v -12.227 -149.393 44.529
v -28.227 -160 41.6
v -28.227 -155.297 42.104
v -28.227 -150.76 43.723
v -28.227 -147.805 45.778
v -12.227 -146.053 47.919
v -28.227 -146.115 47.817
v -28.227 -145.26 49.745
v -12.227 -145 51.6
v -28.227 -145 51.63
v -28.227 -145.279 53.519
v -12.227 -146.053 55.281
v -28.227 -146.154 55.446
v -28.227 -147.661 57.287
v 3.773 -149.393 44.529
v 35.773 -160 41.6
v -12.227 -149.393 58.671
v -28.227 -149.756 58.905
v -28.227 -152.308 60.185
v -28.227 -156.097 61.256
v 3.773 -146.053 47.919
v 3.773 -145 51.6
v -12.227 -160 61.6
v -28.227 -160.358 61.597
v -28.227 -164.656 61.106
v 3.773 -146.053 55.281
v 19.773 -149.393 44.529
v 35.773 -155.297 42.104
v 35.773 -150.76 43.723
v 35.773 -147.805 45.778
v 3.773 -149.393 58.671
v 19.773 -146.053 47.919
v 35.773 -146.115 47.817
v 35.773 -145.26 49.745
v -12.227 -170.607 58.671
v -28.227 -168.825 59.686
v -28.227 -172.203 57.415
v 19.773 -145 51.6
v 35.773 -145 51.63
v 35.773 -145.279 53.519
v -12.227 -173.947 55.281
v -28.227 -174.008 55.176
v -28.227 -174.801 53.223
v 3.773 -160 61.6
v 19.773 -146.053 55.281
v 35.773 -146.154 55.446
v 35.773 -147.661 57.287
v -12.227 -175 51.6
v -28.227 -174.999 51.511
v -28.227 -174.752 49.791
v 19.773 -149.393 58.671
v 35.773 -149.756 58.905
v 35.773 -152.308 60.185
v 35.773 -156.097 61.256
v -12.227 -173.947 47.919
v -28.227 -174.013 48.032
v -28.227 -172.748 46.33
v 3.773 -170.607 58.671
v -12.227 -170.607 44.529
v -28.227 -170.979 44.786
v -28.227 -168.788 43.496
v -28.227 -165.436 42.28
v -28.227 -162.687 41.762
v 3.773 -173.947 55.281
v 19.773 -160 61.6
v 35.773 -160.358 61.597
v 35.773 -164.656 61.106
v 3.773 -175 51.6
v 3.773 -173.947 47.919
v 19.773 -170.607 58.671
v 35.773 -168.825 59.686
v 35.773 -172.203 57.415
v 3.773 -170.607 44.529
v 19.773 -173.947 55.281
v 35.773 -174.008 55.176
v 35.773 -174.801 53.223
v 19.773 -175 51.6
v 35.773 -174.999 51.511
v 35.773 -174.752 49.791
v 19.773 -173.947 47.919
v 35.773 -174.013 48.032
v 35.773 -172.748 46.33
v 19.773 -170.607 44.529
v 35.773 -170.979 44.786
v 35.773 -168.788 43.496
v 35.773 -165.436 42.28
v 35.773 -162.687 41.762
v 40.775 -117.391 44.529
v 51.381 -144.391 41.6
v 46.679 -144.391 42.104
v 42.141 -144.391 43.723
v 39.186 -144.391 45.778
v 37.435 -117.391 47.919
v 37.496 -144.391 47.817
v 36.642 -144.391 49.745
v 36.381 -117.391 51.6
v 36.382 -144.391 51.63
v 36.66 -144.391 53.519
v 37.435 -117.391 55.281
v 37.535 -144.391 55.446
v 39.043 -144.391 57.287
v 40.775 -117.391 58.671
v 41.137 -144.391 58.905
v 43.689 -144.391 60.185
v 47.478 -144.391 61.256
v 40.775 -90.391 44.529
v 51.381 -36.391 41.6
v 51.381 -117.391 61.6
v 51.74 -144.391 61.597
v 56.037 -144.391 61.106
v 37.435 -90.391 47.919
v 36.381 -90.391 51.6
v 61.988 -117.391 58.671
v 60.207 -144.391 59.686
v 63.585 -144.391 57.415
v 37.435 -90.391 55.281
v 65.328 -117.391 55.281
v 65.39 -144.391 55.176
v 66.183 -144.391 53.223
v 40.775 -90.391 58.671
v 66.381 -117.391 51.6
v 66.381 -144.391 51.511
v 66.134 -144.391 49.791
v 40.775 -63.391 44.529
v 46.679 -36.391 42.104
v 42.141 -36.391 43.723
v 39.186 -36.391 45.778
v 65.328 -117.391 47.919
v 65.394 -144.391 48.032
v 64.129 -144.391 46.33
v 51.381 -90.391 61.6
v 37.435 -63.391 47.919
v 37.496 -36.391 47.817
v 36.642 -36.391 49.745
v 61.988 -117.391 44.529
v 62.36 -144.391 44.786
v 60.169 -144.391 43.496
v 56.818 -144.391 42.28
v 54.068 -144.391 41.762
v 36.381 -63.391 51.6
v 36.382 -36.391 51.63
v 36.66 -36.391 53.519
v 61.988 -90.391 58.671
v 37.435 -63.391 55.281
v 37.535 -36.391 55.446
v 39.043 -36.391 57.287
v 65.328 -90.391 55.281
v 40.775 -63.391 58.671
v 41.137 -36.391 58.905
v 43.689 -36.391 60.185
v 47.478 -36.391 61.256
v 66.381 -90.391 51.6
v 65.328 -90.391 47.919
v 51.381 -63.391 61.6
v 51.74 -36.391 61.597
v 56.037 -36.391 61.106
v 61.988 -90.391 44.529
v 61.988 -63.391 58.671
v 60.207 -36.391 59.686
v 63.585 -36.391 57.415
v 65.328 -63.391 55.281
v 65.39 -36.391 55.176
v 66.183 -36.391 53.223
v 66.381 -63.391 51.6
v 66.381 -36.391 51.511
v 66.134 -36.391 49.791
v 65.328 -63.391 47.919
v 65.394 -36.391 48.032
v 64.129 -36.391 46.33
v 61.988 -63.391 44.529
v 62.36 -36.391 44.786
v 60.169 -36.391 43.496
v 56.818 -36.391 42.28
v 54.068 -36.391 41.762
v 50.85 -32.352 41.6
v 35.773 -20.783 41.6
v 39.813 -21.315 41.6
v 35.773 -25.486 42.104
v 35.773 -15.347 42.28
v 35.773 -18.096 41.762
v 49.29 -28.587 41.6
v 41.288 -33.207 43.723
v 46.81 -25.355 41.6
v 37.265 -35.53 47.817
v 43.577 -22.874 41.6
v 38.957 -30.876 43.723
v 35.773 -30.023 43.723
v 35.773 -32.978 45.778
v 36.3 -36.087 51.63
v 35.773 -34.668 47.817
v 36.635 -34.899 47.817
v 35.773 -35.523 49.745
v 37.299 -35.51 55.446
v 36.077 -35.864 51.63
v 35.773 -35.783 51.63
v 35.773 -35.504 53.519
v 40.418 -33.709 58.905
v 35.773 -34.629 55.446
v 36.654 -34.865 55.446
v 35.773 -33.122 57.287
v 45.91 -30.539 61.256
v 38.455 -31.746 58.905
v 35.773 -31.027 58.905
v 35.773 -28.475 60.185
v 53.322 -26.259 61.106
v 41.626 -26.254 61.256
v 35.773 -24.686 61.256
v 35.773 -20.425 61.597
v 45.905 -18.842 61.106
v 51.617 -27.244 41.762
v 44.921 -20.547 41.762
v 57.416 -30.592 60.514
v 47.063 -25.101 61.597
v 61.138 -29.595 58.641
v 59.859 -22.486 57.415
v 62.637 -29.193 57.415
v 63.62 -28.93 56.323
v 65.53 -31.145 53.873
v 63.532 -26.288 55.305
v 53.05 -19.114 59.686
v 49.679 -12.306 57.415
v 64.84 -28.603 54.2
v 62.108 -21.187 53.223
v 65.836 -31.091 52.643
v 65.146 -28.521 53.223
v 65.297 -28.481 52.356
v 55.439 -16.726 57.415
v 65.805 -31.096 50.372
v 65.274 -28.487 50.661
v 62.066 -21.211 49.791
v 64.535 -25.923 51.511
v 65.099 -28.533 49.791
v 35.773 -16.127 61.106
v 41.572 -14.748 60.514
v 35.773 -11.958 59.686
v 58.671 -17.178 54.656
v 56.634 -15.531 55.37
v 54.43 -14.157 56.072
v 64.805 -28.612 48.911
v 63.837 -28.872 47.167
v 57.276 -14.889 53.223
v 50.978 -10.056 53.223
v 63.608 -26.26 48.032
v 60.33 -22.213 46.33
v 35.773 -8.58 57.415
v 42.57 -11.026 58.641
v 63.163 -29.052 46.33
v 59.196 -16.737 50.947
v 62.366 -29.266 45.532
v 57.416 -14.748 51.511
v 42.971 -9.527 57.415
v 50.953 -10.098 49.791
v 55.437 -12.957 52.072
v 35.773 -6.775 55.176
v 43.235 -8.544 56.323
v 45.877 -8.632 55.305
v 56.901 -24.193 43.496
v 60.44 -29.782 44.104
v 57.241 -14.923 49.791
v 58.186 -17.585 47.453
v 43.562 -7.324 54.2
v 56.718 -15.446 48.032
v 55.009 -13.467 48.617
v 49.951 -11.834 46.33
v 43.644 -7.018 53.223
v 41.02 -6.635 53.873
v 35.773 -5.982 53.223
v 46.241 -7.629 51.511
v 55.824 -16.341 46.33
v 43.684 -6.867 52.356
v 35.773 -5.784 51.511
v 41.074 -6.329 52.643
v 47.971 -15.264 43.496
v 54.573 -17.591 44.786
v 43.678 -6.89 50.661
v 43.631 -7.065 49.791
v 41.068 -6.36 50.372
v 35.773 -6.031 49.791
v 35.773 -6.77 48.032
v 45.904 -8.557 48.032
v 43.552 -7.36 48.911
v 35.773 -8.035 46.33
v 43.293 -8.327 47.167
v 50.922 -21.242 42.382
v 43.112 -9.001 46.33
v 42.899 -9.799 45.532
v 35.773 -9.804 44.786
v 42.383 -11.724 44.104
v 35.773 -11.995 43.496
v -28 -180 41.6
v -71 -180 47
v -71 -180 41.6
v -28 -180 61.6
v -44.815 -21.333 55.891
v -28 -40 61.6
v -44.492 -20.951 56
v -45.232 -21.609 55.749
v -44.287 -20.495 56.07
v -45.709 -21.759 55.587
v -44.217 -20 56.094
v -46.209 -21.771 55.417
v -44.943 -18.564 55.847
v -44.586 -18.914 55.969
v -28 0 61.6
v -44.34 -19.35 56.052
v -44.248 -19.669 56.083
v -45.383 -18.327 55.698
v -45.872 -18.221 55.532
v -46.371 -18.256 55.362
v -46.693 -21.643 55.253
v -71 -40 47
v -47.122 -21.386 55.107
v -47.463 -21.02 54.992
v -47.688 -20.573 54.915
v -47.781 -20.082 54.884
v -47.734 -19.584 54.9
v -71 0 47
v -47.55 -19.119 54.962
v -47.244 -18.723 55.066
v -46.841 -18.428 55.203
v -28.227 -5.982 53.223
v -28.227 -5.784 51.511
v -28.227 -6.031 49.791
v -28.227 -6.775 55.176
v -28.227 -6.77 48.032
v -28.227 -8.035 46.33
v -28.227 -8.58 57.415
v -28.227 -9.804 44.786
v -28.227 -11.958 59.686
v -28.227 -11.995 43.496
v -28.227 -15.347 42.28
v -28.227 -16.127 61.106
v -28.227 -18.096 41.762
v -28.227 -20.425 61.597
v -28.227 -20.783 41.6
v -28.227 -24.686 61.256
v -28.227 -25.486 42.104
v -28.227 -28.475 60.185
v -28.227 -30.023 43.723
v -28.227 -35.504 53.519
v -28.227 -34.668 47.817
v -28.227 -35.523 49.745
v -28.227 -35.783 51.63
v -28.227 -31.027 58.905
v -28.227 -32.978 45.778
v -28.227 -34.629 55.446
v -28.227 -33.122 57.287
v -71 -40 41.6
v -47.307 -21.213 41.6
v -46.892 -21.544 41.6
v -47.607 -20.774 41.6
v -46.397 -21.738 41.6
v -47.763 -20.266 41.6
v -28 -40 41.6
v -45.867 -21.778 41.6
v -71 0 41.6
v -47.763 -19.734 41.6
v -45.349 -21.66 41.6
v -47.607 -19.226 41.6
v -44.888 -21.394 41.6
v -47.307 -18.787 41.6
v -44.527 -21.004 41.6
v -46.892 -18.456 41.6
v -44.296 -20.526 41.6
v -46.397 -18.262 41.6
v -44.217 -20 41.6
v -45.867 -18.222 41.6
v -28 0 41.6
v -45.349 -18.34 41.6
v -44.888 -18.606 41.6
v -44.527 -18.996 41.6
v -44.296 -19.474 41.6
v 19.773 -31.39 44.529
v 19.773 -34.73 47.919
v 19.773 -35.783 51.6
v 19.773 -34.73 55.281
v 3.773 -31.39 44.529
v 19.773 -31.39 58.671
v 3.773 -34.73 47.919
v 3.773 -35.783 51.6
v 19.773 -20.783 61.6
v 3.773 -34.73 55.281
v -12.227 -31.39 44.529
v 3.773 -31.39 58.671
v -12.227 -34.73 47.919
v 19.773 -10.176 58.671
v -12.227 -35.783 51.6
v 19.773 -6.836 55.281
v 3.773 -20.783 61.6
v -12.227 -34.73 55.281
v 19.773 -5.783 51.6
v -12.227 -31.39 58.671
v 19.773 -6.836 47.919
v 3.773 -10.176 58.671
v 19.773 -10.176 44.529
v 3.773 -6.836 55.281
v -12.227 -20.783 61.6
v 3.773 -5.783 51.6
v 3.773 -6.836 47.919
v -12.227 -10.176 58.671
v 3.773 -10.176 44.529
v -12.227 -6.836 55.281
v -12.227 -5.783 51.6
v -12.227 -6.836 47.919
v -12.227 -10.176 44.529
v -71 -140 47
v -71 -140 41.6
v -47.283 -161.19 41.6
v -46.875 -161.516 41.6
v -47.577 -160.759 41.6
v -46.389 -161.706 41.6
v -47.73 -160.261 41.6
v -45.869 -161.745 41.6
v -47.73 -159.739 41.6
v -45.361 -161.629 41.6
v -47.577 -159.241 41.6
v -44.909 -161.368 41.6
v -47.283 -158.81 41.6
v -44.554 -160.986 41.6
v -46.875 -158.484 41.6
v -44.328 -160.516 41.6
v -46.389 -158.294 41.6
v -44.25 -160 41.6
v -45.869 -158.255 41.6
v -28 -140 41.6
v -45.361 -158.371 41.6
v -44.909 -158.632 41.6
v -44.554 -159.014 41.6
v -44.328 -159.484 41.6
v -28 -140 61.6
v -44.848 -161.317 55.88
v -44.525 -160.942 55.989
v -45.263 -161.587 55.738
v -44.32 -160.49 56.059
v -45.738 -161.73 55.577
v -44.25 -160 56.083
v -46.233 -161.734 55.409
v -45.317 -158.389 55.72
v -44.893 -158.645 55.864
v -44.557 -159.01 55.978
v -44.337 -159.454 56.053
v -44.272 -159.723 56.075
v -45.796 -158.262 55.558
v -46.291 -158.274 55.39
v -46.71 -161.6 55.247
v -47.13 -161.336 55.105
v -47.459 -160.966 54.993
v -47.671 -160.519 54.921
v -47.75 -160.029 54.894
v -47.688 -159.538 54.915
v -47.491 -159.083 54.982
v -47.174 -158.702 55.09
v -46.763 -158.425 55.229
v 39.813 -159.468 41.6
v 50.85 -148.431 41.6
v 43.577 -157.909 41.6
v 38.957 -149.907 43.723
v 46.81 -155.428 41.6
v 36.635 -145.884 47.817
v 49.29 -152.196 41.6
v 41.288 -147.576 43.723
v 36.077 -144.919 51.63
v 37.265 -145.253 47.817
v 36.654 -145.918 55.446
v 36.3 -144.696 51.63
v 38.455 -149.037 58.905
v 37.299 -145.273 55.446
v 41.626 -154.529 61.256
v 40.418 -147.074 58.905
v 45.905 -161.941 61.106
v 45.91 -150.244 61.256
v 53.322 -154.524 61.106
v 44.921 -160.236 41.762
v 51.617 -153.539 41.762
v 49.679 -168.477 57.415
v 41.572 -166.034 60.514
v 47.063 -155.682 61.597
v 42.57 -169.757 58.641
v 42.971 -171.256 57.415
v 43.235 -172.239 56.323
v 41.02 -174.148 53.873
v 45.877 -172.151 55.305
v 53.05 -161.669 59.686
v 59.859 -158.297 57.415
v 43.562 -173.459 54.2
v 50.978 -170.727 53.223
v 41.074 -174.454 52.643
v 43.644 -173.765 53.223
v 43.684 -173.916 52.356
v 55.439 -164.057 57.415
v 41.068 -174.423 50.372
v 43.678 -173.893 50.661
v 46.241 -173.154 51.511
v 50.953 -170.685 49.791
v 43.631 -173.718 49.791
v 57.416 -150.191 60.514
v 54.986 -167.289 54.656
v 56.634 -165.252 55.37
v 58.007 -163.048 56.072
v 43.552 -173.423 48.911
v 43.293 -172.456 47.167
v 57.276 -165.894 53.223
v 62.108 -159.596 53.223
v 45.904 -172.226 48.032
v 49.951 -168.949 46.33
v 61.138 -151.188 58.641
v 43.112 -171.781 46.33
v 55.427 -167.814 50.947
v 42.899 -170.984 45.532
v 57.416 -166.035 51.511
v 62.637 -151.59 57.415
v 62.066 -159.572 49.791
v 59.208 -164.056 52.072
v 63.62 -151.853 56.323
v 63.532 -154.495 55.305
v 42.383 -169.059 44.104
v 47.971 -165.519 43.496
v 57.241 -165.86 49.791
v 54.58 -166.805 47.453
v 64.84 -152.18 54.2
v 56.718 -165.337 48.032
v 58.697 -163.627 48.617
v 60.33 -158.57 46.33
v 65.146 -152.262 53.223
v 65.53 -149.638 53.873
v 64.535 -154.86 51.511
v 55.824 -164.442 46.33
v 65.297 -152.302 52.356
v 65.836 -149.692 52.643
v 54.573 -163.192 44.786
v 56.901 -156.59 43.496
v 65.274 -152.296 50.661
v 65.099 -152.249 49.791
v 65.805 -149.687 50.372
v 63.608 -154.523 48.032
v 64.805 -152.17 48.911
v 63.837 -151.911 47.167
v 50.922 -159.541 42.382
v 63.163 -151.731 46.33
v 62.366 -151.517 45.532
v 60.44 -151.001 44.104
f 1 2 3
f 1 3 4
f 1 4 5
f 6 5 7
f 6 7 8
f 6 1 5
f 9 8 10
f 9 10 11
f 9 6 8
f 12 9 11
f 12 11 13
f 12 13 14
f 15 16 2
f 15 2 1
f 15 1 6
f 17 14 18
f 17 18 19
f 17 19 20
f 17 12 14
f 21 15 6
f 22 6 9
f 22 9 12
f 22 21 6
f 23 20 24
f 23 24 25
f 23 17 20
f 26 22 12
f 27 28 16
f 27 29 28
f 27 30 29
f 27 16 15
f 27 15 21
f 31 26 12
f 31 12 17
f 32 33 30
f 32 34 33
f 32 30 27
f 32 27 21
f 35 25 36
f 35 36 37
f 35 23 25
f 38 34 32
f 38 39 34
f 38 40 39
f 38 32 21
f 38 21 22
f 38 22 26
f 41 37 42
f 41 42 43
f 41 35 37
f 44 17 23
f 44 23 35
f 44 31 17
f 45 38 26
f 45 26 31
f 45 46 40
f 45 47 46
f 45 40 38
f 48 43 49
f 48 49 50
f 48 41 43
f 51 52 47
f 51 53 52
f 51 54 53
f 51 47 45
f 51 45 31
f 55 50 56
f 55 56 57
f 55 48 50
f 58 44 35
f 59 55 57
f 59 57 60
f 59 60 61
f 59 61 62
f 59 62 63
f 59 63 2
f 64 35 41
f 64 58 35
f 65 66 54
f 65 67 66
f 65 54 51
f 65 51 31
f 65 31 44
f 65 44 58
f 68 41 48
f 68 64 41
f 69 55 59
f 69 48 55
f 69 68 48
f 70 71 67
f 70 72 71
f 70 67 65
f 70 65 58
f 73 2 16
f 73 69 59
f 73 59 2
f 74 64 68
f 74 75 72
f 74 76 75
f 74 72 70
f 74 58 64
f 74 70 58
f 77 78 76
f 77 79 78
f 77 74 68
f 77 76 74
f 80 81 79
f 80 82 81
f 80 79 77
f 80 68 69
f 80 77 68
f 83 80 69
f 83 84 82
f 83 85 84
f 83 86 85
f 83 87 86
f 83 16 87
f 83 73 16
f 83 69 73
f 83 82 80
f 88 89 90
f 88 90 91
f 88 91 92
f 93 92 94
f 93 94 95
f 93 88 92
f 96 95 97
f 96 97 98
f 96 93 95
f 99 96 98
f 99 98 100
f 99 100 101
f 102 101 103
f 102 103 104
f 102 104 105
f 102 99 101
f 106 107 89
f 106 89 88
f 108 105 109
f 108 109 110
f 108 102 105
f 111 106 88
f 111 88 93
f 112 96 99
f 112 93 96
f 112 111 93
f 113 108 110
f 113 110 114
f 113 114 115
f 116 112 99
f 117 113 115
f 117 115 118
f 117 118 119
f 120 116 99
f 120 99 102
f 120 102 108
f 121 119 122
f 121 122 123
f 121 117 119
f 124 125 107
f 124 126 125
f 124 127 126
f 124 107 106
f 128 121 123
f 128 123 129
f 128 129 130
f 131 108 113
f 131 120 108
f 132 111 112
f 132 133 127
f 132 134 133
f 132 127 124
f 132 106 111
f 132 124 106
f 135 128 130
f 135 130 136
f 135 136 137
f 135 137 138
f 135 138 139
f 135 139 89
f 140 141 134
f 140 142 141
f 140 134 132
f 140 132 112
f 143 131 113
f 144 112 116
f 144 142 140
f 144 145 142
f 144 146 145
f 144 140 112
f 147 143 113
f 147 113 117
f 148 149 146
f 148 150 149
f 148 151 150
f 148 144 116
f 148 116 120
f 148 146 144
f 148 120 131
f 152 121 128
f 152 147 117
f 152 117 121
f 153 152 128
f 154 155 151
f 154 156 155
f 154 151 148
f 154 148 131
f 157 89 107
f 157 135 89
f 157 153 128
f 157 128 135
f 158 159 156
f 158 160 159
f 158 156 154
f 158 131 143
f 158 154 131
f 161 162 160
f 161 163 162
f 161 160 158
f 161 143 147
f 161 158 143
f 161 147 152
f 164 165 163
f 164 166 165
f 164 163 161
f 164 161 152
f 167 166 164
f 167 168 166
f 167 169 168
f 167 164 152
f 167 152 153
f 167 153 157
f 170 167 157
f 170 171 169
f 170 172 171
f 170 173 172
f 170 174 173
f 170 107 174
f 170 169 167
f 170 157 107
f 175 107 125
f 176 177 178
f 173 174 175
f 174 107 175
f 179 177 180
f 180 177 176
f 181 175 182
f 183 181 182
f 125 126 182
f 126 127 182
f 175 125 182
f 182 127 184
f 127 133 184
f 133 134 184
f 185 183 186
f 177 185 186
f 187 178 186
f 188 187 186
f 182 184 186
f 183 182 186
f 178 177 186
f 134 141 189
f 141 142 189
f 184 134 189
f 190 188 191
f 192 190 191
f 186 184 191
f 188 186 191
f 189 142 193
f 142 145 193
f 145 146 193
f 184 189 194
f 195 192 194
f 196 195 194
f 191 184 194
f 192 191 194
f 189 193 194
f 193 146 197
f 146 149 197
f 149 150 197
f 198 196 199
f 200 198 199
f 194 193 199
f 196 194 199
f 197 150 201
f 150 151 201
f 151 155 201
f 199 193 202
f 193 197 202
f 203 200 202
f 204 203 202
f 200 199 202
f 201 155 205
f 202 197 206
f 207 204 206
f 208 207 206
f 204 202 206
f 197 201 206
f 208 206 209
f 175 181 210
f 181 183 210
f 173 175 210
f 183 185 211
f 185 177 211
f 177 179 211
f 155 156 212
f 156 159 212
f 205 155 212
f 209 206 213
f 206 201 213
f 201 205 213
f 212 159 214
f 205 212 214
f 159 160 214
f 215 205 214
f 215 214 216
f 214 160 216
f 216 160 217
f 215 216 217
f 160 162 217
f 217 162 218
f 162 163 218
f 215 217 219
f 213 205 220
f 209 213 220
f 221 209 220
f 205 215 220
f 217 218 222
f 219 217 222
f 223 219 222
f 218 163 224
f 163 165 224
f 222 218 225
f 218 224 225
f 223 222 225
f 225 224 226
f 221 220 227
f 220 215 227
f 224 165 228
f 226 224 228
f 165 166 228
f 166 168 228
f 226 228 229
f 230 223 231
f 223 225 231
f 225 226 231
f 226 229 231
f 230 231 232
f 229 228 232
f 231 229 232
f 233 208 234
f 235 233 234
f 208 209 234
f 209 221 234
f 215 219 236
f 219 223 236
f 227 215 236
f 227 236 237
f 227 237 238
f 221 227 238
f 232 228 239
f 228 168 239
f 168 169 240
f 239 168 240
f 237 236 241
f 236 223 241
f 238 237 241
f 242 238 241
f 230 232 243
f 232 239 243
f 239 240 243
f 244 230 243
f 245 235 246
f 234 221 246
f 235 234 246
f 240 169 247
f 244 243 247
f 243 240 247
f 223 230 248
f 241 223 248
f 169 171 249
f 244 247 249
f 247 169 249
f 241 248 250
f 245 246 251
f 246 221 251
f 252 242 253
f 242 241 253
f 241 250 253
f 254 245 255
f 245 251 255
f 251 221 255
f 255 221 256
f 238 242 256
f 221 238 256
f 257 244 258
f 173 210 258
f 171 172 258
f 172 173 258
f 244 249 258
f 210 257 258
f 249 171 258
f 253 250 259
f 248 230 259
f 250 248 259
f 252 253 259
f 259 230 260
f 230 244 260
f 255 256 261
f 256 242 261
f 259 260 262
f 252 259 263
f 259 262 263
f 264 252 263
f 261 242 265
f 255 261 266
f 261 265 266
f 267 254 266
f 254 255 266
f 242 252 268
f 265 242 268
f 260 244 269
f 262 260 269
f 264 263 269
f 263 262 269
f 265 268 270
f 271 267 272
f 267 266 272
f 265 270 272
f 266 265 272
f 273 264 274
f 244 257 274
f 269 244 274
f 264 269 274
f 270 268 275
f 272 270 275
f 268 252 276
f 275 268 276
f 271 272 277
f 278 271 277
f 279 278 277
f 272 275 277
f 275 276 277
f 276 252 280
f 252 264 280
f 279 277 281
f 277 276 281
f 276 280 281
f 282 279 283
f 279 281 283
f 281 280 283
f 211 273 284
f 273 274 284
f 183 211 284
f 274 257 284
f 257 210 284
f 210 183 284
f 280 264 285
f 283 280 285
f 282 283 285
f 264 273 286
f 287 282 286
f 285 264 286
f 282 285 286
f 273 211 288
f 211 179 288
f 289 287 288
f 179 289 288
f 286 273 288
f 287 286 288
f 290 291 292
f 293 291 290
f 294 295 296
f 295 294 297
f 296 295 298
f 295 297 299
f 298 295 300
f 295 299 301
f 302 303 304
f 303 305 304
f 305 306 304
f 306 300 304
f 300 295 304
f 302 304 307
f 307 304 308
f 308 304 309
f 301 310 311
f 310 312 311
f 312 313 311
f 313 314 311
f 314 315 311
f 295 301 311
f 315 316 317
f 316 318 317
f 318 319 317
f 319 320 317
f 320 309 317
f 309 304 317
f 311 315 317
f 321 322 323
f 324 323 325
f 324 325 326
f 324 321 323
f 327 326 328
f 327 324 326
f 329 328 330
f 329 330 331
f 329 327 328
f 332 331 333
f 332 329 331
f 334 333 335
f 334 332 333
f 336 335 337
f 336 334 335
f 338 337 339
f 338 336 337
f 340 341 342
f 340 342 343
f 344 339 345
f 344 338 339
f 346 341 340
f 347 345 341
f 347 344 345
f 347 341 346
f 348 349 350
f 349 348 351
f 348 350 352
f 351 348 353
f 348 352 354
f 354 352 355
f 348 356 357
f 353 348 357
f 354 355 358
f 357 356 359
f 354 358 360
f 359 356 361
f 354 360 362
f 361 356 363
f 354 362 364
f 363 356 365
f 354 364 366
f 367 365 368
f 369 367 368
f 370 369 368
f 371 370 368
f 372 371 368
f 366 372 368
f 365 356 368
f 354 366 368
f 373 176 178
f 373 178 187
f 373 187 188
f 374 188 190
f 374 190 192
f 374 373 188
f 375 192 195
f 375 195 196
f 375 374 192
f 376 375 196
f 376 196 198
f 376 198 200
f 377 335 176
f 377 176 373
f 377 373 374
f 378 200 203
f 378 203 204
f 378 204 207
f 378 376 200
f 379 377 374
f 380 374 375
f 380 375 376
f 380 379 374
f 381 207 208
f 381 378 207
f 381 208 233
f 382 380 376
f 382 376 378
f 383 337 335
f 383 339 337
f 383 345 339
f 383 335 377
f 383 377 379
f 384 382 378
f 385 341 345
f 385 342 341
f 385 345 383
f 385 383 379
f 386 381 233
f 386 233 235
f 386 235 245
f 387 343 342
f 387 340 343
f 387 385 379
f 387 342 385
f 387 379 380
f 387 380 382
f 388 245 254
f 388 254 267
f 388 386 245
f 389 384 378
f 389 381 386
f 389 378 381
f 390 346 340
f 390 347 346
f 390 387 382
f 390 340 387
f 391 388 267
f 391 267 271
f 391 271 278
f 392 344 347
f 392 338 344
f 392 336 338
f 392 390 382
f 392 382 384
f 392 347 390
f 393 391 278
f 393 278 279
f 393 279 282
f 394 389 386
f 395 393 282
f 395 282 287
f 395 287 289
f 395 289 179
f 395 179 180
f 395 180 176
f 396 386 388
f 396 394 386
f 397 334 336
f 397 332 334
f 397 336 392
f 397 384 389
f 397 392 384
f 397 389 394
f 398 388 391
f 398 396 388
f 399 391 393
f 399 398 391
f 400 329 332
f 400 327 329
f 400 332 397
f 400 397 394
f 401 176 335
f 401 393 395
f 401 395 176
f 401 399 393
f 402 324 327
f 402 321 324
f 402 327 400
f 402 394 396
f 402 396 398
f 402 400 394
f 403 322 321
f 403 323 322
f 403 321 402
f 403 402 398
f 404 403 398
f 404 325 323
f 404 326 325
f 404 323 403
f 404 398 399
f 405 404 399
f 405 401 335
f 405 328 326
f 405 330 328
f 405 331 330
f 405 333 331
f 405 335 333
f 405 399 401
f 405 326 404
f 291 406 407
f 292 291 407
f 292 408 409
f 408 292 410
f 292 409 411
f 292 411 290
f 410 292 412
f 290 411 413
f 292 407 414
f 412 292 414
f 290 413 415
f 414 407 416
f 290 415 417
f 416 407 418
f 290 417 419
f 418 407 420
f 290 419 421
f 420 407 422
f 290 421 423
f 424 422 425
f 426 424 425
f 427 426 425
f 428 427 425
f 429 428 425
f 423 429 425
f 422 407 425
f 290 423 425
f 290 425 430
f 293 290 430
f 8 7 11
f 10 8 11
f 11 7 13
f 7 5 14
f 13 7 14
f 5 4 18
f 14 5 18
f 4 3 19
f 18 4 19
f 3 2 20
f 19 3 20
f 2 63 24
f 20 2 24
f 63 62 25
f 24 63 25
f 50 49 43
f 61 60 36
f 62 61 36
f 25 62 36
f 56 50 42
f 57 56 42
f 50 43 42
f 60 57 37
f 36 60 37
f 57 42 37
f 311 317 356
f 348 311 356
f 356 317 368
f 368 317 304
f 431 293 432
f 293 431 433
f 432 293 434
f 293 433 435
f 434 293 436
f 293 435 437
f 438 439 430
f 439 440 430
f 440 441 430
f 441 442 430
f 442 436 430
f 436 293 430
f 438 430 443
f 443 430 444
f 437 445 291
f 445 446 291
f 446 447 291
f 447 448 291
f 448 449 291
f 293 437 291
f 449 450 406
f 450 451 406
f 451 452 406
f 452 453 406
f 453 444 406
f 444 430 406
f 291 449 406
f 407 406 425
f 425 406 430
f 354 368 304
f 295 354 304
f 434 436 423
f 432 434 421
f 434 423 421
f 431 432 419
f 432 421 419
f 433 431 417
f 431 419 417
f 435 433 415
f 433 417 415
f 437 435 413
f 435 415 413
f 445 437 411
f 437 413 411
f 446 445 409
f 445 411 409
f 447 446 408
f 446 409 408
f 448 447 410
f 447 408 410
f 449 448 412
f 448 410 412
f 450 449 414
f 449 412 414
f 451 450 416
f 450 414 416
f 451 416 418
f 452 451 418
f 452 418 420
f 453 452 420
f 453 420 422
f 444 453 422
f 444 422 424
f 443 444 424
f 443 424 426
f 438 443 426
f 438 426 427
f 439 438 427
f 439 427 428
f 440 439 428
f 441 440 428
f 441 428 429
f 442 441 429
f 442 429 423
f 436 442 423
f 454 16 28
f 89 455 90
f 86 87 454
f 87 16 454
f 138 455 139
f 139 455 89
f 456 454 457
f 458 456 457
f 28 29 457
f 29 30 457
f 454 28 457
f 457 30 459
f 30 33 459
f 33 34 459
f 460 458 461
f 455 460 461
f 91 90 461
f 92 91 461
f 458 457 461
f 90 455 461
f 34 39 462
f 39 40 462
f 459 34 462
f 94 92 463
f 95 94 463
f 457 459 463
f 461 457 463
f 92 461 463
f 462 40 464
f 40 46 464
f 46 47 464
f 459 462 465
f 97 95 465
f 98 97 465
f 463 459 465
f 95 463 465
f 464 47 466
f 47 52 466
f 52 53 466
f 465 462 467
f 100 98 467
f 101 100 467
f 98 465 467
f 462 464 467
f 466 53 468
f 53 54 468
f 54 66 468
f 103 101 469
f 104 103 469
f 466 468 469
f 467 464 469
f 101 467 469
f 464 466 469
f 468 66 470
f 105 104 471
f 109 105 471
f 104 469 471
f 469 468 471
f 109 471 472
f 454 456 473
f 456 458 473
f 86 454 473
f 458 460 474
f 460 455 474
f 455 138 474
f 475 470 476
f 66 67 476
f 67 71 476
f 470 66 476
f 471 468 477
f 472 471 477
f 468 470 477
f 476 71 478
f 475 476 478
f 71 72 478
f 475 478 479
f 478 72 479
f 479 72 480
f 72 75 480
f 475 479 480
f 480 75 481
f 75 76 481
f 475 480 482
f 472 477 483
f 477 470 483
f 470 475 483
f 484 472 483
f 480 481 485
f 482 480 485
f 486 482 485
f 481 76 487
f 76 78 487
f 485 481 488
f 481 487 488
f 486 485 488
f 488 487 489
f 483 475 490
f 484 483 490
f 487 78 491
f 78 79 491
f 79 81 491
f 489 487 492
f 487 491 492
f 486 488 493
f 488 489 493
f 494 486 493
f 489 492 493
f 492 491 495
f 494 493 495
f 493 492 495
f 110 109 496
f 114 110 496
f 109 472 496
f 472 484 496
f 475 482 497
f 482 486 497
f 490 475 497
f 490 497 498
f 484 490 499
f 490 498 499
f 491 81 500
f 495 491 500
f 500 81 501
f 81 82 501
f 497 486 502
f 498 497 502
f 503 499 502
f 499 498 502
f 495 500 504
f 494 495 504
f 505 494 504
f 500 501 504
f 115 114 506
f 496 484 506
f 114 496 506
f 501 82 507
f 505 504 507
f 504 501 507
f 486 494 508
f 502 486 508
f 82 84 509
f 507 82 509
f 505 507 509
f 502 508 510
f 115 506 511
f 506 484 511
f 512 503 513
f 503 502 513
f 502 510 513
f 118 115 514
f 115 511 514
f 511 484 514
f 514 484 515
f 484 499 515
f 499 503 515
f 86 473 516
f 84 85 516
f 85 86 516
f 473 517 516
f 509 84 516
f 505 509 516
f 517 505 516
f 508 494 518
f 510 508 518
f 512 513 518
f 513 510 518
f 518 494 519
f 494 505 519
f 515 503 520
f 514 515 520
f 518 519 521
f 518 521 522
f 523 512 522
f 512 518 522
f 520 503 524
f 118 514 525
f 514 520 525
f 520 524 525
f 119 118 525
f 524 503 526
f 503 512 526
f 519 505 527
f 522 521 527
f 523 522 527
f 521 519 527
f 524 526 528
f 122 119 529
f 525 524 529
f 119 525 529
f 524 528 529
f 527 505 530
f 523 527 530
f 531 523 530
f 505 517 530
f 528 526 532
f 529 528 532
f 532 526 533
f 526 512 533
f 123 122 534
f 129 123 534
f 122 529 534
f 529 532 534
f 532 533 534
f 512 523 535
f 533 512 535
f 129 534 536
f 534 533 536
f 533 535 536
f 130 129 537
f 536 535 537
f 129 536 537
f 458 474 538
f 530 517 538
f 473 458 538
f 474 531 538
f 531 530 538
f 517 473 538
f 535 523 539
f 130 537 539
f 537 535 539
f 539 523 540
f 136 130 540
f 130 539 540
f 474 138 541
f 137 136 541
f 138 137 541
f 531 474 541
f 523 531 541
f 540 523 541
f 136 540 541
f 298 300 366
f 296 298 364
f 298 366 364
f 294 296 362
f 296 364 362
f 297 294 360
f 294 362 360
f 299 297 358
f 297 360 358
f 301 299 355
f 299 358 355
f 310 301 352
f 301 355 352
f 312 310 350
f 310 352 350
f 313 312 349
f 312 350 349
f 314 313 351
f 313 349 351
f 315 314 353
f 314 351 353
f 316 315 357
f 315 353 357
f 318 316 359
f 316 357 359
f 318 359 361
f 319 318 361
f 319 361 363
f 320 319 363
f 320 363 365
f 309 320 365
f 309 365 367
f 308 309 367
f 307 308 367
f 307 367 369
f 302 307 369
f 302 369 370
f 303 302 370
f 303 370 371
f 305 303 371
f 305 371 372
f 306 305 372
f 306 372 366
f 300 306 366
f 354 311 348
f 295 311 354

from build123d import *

# Parameters (mm, degrees)
F1_DEPTH  = 40
F4_DEPTH  = 40
F10_R     = 1.75
F10_R_2   = 1.7831750166
F11_DEPTH = 25


with BuildPart() as f1:
    # F0 (on Front) → F1 (new body)
    with BuildSketch(Plane.XZ):
        Polygon((-28, 47), (-28, 61.6), (-71, 47), (-71, 41.6), (-28, 41.6), align=None)
    extrude(amount=F1_DEPTH)


with BuildPart() as f4:
    # F3 (on offset) → F4 (new body)
    with BuildSketch(Plane.XZ.offset(140)):
        Polygon((-28, 47), (-28, 61.6), (-71, 47), (-71, 41.6), (-28, 41.6), align=None)
    extrude(amount=F4_DEPTH)


with BuildPart() as f8:
    # F8: sweep along a path in F7
    with BuildLine(Plane(origin=(0, 0, 51.6), x_dir=(1, 0, 0), z_dir=(0, 0, -1))) as f8_path:
        Line((-28.2270391732, 160.3914648294), (35.7729608268, 160.3914648294))
        ThreePointArc((35.7729608268, 160.3914648294), (47.0866693257, 155.7051733284), (51.7729608268, 144.3914648294))
        Line((51.7729608268, 144.3914648294), (51.7729608268, 36.3914648294))
        ThreePointArc((51.7729608268, 36.3914648294), (47.0866693257, 25.0777563305), (35.7729608268, 20.3914648294))
        Line((35.7729608268, 20.3914648294), (-28.2270391732, 20.3914648294))
    # F5 (on face) → F8 (sweep)
    with BuildSketch(Plane.YZ.offset(-28)):
        with BuildLine():
            add(Edge.make_bspline(
                [(-160, 61.6), (-175, 61.6), (-175, 51.6)],
                knots=[4.7123889804, 4.7123889804, 4.7123889804, 6.2831853072, 6.2831853072, 6.2831853072], degree=2, weights=[1, 0.7071067812, 1]))
            add(Edge.make_bspline(
                [(-175, 51.6), (-175, 41.6), (-160, 41.6)],
                knots=[0, 0, 0, 1.5707963268, 1.5707963268, 1.5707963268], degree=2, weights=[1, 0.7071067812, 1]))
            add(Edge.make_bspline(
                [(-160, 41.6), (-145, 41.6), (-145, 51.6), (-145, 61.6), (-160, 61.6)],
                knots=[1.5707963268, 1.5707963268, 1.5707963268, 3.1415926536, 3.1415926536, 4.7123889804, 4.7123889804, 4.7123889804], degree=2, weights=[1, 0.7071067812, 1, 0.7071067812, 1]))
        make_face()
    sweep(path=f8_path.line)


with BuildPart() as f11_tool:
    # F10 (on offset) → F11 (new body)
    with BuildSketch(Plane(origin=(0, 0, 41.6), x_dir=(1, 0, 0), z_dir=(0, 0, -1))):
        with Locations((-46, 160)):
            Circle(F10_R)
        with Locations((-46, 20)):
            Circle(F10_R_2)
    extrude(amount=-F11_DEPTH)


with BuildPart() as f1_1:
    add(f1.part)

    # F11: cut by f11_tool
    add(f11_tool.part, mode=Mode.SUBTRACT)


with BuildPart() as f4_1:
    add(f4.part)

    # F11: cut by f11_tool
    add(f11_tool.part, mode=Mode.SUBTRACT)


solid = Compound([f8.part, f1_1.part, f4_1.part])
